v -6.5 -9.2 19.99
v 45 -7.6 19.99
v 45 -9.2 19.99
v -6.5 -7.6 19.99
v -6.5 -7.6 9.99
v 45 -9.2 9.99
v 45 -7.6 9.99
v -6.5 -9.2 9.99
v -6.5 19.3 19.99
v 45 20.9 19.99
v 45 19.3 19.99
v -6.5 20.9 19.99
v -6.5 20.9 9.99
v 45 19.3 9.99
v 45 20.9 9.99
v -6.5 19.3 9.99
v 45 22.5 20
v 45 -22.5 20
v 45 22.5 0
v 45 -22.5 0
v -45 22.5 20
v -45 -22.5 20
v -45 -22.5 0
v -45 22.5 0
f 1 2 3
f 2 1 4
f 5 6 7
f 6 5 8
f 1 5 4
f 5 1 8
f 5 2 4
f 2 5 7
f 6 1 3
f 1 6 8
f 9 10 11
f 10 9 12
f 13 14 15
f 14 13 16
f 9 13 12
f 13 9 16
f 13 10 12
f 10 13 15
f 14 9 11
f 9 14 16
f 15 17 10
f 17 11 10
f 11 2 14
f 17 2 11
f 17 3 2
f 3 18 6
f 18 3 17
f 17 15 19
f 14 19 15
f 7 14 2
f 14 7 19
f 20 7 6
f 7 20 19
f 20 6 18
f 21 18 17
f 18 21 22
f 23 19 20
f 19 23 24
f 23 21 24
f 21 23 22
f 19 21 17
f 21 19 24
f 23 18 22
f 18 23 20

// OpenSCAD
// Drying rack for microscope slides - a solid base block with a row of parallel slots cut into
// the top face so slides stand upright on their long edge. NOVEL general part (not a part I have
// designed before).
//

slides_per_row = 10;
slide_l = 75;
slide_w = 25;
slide_t = 1;
base_l = 90;
base_w = 45;
base_h = 20;
slot_l = 77;
slot_w = 1.6;
slot_d = 10;
slot_pitch = 3.5;

$fn = 48;

row_w = slide_w + slot_pitch;
rows = ceil(base_w / row_w);
fit   = base_l >= slide_l + 2;          // leave 1 mm clearance at each end in X
fit_y = base_w >= rows * row_w;         // room for the rows in Y

difference() {
    translate([-base_l / 2, -base_w / 2, 0]) cube([base_l, base_w, base_h]);
    for (r = [0 : rows - 1])
        for (c = [0 : slides_per_row - 1])
            translate([
                -base_l / 2 + slide_l / 2 + 1 + c * slot_pitch,
                -base_w / 2 + r * row_w + slide_w / 2 + 0.8,
                base_h - slot_d - 0.01
            ]) cube([slot_l, slot_w, slot_d]);
}
